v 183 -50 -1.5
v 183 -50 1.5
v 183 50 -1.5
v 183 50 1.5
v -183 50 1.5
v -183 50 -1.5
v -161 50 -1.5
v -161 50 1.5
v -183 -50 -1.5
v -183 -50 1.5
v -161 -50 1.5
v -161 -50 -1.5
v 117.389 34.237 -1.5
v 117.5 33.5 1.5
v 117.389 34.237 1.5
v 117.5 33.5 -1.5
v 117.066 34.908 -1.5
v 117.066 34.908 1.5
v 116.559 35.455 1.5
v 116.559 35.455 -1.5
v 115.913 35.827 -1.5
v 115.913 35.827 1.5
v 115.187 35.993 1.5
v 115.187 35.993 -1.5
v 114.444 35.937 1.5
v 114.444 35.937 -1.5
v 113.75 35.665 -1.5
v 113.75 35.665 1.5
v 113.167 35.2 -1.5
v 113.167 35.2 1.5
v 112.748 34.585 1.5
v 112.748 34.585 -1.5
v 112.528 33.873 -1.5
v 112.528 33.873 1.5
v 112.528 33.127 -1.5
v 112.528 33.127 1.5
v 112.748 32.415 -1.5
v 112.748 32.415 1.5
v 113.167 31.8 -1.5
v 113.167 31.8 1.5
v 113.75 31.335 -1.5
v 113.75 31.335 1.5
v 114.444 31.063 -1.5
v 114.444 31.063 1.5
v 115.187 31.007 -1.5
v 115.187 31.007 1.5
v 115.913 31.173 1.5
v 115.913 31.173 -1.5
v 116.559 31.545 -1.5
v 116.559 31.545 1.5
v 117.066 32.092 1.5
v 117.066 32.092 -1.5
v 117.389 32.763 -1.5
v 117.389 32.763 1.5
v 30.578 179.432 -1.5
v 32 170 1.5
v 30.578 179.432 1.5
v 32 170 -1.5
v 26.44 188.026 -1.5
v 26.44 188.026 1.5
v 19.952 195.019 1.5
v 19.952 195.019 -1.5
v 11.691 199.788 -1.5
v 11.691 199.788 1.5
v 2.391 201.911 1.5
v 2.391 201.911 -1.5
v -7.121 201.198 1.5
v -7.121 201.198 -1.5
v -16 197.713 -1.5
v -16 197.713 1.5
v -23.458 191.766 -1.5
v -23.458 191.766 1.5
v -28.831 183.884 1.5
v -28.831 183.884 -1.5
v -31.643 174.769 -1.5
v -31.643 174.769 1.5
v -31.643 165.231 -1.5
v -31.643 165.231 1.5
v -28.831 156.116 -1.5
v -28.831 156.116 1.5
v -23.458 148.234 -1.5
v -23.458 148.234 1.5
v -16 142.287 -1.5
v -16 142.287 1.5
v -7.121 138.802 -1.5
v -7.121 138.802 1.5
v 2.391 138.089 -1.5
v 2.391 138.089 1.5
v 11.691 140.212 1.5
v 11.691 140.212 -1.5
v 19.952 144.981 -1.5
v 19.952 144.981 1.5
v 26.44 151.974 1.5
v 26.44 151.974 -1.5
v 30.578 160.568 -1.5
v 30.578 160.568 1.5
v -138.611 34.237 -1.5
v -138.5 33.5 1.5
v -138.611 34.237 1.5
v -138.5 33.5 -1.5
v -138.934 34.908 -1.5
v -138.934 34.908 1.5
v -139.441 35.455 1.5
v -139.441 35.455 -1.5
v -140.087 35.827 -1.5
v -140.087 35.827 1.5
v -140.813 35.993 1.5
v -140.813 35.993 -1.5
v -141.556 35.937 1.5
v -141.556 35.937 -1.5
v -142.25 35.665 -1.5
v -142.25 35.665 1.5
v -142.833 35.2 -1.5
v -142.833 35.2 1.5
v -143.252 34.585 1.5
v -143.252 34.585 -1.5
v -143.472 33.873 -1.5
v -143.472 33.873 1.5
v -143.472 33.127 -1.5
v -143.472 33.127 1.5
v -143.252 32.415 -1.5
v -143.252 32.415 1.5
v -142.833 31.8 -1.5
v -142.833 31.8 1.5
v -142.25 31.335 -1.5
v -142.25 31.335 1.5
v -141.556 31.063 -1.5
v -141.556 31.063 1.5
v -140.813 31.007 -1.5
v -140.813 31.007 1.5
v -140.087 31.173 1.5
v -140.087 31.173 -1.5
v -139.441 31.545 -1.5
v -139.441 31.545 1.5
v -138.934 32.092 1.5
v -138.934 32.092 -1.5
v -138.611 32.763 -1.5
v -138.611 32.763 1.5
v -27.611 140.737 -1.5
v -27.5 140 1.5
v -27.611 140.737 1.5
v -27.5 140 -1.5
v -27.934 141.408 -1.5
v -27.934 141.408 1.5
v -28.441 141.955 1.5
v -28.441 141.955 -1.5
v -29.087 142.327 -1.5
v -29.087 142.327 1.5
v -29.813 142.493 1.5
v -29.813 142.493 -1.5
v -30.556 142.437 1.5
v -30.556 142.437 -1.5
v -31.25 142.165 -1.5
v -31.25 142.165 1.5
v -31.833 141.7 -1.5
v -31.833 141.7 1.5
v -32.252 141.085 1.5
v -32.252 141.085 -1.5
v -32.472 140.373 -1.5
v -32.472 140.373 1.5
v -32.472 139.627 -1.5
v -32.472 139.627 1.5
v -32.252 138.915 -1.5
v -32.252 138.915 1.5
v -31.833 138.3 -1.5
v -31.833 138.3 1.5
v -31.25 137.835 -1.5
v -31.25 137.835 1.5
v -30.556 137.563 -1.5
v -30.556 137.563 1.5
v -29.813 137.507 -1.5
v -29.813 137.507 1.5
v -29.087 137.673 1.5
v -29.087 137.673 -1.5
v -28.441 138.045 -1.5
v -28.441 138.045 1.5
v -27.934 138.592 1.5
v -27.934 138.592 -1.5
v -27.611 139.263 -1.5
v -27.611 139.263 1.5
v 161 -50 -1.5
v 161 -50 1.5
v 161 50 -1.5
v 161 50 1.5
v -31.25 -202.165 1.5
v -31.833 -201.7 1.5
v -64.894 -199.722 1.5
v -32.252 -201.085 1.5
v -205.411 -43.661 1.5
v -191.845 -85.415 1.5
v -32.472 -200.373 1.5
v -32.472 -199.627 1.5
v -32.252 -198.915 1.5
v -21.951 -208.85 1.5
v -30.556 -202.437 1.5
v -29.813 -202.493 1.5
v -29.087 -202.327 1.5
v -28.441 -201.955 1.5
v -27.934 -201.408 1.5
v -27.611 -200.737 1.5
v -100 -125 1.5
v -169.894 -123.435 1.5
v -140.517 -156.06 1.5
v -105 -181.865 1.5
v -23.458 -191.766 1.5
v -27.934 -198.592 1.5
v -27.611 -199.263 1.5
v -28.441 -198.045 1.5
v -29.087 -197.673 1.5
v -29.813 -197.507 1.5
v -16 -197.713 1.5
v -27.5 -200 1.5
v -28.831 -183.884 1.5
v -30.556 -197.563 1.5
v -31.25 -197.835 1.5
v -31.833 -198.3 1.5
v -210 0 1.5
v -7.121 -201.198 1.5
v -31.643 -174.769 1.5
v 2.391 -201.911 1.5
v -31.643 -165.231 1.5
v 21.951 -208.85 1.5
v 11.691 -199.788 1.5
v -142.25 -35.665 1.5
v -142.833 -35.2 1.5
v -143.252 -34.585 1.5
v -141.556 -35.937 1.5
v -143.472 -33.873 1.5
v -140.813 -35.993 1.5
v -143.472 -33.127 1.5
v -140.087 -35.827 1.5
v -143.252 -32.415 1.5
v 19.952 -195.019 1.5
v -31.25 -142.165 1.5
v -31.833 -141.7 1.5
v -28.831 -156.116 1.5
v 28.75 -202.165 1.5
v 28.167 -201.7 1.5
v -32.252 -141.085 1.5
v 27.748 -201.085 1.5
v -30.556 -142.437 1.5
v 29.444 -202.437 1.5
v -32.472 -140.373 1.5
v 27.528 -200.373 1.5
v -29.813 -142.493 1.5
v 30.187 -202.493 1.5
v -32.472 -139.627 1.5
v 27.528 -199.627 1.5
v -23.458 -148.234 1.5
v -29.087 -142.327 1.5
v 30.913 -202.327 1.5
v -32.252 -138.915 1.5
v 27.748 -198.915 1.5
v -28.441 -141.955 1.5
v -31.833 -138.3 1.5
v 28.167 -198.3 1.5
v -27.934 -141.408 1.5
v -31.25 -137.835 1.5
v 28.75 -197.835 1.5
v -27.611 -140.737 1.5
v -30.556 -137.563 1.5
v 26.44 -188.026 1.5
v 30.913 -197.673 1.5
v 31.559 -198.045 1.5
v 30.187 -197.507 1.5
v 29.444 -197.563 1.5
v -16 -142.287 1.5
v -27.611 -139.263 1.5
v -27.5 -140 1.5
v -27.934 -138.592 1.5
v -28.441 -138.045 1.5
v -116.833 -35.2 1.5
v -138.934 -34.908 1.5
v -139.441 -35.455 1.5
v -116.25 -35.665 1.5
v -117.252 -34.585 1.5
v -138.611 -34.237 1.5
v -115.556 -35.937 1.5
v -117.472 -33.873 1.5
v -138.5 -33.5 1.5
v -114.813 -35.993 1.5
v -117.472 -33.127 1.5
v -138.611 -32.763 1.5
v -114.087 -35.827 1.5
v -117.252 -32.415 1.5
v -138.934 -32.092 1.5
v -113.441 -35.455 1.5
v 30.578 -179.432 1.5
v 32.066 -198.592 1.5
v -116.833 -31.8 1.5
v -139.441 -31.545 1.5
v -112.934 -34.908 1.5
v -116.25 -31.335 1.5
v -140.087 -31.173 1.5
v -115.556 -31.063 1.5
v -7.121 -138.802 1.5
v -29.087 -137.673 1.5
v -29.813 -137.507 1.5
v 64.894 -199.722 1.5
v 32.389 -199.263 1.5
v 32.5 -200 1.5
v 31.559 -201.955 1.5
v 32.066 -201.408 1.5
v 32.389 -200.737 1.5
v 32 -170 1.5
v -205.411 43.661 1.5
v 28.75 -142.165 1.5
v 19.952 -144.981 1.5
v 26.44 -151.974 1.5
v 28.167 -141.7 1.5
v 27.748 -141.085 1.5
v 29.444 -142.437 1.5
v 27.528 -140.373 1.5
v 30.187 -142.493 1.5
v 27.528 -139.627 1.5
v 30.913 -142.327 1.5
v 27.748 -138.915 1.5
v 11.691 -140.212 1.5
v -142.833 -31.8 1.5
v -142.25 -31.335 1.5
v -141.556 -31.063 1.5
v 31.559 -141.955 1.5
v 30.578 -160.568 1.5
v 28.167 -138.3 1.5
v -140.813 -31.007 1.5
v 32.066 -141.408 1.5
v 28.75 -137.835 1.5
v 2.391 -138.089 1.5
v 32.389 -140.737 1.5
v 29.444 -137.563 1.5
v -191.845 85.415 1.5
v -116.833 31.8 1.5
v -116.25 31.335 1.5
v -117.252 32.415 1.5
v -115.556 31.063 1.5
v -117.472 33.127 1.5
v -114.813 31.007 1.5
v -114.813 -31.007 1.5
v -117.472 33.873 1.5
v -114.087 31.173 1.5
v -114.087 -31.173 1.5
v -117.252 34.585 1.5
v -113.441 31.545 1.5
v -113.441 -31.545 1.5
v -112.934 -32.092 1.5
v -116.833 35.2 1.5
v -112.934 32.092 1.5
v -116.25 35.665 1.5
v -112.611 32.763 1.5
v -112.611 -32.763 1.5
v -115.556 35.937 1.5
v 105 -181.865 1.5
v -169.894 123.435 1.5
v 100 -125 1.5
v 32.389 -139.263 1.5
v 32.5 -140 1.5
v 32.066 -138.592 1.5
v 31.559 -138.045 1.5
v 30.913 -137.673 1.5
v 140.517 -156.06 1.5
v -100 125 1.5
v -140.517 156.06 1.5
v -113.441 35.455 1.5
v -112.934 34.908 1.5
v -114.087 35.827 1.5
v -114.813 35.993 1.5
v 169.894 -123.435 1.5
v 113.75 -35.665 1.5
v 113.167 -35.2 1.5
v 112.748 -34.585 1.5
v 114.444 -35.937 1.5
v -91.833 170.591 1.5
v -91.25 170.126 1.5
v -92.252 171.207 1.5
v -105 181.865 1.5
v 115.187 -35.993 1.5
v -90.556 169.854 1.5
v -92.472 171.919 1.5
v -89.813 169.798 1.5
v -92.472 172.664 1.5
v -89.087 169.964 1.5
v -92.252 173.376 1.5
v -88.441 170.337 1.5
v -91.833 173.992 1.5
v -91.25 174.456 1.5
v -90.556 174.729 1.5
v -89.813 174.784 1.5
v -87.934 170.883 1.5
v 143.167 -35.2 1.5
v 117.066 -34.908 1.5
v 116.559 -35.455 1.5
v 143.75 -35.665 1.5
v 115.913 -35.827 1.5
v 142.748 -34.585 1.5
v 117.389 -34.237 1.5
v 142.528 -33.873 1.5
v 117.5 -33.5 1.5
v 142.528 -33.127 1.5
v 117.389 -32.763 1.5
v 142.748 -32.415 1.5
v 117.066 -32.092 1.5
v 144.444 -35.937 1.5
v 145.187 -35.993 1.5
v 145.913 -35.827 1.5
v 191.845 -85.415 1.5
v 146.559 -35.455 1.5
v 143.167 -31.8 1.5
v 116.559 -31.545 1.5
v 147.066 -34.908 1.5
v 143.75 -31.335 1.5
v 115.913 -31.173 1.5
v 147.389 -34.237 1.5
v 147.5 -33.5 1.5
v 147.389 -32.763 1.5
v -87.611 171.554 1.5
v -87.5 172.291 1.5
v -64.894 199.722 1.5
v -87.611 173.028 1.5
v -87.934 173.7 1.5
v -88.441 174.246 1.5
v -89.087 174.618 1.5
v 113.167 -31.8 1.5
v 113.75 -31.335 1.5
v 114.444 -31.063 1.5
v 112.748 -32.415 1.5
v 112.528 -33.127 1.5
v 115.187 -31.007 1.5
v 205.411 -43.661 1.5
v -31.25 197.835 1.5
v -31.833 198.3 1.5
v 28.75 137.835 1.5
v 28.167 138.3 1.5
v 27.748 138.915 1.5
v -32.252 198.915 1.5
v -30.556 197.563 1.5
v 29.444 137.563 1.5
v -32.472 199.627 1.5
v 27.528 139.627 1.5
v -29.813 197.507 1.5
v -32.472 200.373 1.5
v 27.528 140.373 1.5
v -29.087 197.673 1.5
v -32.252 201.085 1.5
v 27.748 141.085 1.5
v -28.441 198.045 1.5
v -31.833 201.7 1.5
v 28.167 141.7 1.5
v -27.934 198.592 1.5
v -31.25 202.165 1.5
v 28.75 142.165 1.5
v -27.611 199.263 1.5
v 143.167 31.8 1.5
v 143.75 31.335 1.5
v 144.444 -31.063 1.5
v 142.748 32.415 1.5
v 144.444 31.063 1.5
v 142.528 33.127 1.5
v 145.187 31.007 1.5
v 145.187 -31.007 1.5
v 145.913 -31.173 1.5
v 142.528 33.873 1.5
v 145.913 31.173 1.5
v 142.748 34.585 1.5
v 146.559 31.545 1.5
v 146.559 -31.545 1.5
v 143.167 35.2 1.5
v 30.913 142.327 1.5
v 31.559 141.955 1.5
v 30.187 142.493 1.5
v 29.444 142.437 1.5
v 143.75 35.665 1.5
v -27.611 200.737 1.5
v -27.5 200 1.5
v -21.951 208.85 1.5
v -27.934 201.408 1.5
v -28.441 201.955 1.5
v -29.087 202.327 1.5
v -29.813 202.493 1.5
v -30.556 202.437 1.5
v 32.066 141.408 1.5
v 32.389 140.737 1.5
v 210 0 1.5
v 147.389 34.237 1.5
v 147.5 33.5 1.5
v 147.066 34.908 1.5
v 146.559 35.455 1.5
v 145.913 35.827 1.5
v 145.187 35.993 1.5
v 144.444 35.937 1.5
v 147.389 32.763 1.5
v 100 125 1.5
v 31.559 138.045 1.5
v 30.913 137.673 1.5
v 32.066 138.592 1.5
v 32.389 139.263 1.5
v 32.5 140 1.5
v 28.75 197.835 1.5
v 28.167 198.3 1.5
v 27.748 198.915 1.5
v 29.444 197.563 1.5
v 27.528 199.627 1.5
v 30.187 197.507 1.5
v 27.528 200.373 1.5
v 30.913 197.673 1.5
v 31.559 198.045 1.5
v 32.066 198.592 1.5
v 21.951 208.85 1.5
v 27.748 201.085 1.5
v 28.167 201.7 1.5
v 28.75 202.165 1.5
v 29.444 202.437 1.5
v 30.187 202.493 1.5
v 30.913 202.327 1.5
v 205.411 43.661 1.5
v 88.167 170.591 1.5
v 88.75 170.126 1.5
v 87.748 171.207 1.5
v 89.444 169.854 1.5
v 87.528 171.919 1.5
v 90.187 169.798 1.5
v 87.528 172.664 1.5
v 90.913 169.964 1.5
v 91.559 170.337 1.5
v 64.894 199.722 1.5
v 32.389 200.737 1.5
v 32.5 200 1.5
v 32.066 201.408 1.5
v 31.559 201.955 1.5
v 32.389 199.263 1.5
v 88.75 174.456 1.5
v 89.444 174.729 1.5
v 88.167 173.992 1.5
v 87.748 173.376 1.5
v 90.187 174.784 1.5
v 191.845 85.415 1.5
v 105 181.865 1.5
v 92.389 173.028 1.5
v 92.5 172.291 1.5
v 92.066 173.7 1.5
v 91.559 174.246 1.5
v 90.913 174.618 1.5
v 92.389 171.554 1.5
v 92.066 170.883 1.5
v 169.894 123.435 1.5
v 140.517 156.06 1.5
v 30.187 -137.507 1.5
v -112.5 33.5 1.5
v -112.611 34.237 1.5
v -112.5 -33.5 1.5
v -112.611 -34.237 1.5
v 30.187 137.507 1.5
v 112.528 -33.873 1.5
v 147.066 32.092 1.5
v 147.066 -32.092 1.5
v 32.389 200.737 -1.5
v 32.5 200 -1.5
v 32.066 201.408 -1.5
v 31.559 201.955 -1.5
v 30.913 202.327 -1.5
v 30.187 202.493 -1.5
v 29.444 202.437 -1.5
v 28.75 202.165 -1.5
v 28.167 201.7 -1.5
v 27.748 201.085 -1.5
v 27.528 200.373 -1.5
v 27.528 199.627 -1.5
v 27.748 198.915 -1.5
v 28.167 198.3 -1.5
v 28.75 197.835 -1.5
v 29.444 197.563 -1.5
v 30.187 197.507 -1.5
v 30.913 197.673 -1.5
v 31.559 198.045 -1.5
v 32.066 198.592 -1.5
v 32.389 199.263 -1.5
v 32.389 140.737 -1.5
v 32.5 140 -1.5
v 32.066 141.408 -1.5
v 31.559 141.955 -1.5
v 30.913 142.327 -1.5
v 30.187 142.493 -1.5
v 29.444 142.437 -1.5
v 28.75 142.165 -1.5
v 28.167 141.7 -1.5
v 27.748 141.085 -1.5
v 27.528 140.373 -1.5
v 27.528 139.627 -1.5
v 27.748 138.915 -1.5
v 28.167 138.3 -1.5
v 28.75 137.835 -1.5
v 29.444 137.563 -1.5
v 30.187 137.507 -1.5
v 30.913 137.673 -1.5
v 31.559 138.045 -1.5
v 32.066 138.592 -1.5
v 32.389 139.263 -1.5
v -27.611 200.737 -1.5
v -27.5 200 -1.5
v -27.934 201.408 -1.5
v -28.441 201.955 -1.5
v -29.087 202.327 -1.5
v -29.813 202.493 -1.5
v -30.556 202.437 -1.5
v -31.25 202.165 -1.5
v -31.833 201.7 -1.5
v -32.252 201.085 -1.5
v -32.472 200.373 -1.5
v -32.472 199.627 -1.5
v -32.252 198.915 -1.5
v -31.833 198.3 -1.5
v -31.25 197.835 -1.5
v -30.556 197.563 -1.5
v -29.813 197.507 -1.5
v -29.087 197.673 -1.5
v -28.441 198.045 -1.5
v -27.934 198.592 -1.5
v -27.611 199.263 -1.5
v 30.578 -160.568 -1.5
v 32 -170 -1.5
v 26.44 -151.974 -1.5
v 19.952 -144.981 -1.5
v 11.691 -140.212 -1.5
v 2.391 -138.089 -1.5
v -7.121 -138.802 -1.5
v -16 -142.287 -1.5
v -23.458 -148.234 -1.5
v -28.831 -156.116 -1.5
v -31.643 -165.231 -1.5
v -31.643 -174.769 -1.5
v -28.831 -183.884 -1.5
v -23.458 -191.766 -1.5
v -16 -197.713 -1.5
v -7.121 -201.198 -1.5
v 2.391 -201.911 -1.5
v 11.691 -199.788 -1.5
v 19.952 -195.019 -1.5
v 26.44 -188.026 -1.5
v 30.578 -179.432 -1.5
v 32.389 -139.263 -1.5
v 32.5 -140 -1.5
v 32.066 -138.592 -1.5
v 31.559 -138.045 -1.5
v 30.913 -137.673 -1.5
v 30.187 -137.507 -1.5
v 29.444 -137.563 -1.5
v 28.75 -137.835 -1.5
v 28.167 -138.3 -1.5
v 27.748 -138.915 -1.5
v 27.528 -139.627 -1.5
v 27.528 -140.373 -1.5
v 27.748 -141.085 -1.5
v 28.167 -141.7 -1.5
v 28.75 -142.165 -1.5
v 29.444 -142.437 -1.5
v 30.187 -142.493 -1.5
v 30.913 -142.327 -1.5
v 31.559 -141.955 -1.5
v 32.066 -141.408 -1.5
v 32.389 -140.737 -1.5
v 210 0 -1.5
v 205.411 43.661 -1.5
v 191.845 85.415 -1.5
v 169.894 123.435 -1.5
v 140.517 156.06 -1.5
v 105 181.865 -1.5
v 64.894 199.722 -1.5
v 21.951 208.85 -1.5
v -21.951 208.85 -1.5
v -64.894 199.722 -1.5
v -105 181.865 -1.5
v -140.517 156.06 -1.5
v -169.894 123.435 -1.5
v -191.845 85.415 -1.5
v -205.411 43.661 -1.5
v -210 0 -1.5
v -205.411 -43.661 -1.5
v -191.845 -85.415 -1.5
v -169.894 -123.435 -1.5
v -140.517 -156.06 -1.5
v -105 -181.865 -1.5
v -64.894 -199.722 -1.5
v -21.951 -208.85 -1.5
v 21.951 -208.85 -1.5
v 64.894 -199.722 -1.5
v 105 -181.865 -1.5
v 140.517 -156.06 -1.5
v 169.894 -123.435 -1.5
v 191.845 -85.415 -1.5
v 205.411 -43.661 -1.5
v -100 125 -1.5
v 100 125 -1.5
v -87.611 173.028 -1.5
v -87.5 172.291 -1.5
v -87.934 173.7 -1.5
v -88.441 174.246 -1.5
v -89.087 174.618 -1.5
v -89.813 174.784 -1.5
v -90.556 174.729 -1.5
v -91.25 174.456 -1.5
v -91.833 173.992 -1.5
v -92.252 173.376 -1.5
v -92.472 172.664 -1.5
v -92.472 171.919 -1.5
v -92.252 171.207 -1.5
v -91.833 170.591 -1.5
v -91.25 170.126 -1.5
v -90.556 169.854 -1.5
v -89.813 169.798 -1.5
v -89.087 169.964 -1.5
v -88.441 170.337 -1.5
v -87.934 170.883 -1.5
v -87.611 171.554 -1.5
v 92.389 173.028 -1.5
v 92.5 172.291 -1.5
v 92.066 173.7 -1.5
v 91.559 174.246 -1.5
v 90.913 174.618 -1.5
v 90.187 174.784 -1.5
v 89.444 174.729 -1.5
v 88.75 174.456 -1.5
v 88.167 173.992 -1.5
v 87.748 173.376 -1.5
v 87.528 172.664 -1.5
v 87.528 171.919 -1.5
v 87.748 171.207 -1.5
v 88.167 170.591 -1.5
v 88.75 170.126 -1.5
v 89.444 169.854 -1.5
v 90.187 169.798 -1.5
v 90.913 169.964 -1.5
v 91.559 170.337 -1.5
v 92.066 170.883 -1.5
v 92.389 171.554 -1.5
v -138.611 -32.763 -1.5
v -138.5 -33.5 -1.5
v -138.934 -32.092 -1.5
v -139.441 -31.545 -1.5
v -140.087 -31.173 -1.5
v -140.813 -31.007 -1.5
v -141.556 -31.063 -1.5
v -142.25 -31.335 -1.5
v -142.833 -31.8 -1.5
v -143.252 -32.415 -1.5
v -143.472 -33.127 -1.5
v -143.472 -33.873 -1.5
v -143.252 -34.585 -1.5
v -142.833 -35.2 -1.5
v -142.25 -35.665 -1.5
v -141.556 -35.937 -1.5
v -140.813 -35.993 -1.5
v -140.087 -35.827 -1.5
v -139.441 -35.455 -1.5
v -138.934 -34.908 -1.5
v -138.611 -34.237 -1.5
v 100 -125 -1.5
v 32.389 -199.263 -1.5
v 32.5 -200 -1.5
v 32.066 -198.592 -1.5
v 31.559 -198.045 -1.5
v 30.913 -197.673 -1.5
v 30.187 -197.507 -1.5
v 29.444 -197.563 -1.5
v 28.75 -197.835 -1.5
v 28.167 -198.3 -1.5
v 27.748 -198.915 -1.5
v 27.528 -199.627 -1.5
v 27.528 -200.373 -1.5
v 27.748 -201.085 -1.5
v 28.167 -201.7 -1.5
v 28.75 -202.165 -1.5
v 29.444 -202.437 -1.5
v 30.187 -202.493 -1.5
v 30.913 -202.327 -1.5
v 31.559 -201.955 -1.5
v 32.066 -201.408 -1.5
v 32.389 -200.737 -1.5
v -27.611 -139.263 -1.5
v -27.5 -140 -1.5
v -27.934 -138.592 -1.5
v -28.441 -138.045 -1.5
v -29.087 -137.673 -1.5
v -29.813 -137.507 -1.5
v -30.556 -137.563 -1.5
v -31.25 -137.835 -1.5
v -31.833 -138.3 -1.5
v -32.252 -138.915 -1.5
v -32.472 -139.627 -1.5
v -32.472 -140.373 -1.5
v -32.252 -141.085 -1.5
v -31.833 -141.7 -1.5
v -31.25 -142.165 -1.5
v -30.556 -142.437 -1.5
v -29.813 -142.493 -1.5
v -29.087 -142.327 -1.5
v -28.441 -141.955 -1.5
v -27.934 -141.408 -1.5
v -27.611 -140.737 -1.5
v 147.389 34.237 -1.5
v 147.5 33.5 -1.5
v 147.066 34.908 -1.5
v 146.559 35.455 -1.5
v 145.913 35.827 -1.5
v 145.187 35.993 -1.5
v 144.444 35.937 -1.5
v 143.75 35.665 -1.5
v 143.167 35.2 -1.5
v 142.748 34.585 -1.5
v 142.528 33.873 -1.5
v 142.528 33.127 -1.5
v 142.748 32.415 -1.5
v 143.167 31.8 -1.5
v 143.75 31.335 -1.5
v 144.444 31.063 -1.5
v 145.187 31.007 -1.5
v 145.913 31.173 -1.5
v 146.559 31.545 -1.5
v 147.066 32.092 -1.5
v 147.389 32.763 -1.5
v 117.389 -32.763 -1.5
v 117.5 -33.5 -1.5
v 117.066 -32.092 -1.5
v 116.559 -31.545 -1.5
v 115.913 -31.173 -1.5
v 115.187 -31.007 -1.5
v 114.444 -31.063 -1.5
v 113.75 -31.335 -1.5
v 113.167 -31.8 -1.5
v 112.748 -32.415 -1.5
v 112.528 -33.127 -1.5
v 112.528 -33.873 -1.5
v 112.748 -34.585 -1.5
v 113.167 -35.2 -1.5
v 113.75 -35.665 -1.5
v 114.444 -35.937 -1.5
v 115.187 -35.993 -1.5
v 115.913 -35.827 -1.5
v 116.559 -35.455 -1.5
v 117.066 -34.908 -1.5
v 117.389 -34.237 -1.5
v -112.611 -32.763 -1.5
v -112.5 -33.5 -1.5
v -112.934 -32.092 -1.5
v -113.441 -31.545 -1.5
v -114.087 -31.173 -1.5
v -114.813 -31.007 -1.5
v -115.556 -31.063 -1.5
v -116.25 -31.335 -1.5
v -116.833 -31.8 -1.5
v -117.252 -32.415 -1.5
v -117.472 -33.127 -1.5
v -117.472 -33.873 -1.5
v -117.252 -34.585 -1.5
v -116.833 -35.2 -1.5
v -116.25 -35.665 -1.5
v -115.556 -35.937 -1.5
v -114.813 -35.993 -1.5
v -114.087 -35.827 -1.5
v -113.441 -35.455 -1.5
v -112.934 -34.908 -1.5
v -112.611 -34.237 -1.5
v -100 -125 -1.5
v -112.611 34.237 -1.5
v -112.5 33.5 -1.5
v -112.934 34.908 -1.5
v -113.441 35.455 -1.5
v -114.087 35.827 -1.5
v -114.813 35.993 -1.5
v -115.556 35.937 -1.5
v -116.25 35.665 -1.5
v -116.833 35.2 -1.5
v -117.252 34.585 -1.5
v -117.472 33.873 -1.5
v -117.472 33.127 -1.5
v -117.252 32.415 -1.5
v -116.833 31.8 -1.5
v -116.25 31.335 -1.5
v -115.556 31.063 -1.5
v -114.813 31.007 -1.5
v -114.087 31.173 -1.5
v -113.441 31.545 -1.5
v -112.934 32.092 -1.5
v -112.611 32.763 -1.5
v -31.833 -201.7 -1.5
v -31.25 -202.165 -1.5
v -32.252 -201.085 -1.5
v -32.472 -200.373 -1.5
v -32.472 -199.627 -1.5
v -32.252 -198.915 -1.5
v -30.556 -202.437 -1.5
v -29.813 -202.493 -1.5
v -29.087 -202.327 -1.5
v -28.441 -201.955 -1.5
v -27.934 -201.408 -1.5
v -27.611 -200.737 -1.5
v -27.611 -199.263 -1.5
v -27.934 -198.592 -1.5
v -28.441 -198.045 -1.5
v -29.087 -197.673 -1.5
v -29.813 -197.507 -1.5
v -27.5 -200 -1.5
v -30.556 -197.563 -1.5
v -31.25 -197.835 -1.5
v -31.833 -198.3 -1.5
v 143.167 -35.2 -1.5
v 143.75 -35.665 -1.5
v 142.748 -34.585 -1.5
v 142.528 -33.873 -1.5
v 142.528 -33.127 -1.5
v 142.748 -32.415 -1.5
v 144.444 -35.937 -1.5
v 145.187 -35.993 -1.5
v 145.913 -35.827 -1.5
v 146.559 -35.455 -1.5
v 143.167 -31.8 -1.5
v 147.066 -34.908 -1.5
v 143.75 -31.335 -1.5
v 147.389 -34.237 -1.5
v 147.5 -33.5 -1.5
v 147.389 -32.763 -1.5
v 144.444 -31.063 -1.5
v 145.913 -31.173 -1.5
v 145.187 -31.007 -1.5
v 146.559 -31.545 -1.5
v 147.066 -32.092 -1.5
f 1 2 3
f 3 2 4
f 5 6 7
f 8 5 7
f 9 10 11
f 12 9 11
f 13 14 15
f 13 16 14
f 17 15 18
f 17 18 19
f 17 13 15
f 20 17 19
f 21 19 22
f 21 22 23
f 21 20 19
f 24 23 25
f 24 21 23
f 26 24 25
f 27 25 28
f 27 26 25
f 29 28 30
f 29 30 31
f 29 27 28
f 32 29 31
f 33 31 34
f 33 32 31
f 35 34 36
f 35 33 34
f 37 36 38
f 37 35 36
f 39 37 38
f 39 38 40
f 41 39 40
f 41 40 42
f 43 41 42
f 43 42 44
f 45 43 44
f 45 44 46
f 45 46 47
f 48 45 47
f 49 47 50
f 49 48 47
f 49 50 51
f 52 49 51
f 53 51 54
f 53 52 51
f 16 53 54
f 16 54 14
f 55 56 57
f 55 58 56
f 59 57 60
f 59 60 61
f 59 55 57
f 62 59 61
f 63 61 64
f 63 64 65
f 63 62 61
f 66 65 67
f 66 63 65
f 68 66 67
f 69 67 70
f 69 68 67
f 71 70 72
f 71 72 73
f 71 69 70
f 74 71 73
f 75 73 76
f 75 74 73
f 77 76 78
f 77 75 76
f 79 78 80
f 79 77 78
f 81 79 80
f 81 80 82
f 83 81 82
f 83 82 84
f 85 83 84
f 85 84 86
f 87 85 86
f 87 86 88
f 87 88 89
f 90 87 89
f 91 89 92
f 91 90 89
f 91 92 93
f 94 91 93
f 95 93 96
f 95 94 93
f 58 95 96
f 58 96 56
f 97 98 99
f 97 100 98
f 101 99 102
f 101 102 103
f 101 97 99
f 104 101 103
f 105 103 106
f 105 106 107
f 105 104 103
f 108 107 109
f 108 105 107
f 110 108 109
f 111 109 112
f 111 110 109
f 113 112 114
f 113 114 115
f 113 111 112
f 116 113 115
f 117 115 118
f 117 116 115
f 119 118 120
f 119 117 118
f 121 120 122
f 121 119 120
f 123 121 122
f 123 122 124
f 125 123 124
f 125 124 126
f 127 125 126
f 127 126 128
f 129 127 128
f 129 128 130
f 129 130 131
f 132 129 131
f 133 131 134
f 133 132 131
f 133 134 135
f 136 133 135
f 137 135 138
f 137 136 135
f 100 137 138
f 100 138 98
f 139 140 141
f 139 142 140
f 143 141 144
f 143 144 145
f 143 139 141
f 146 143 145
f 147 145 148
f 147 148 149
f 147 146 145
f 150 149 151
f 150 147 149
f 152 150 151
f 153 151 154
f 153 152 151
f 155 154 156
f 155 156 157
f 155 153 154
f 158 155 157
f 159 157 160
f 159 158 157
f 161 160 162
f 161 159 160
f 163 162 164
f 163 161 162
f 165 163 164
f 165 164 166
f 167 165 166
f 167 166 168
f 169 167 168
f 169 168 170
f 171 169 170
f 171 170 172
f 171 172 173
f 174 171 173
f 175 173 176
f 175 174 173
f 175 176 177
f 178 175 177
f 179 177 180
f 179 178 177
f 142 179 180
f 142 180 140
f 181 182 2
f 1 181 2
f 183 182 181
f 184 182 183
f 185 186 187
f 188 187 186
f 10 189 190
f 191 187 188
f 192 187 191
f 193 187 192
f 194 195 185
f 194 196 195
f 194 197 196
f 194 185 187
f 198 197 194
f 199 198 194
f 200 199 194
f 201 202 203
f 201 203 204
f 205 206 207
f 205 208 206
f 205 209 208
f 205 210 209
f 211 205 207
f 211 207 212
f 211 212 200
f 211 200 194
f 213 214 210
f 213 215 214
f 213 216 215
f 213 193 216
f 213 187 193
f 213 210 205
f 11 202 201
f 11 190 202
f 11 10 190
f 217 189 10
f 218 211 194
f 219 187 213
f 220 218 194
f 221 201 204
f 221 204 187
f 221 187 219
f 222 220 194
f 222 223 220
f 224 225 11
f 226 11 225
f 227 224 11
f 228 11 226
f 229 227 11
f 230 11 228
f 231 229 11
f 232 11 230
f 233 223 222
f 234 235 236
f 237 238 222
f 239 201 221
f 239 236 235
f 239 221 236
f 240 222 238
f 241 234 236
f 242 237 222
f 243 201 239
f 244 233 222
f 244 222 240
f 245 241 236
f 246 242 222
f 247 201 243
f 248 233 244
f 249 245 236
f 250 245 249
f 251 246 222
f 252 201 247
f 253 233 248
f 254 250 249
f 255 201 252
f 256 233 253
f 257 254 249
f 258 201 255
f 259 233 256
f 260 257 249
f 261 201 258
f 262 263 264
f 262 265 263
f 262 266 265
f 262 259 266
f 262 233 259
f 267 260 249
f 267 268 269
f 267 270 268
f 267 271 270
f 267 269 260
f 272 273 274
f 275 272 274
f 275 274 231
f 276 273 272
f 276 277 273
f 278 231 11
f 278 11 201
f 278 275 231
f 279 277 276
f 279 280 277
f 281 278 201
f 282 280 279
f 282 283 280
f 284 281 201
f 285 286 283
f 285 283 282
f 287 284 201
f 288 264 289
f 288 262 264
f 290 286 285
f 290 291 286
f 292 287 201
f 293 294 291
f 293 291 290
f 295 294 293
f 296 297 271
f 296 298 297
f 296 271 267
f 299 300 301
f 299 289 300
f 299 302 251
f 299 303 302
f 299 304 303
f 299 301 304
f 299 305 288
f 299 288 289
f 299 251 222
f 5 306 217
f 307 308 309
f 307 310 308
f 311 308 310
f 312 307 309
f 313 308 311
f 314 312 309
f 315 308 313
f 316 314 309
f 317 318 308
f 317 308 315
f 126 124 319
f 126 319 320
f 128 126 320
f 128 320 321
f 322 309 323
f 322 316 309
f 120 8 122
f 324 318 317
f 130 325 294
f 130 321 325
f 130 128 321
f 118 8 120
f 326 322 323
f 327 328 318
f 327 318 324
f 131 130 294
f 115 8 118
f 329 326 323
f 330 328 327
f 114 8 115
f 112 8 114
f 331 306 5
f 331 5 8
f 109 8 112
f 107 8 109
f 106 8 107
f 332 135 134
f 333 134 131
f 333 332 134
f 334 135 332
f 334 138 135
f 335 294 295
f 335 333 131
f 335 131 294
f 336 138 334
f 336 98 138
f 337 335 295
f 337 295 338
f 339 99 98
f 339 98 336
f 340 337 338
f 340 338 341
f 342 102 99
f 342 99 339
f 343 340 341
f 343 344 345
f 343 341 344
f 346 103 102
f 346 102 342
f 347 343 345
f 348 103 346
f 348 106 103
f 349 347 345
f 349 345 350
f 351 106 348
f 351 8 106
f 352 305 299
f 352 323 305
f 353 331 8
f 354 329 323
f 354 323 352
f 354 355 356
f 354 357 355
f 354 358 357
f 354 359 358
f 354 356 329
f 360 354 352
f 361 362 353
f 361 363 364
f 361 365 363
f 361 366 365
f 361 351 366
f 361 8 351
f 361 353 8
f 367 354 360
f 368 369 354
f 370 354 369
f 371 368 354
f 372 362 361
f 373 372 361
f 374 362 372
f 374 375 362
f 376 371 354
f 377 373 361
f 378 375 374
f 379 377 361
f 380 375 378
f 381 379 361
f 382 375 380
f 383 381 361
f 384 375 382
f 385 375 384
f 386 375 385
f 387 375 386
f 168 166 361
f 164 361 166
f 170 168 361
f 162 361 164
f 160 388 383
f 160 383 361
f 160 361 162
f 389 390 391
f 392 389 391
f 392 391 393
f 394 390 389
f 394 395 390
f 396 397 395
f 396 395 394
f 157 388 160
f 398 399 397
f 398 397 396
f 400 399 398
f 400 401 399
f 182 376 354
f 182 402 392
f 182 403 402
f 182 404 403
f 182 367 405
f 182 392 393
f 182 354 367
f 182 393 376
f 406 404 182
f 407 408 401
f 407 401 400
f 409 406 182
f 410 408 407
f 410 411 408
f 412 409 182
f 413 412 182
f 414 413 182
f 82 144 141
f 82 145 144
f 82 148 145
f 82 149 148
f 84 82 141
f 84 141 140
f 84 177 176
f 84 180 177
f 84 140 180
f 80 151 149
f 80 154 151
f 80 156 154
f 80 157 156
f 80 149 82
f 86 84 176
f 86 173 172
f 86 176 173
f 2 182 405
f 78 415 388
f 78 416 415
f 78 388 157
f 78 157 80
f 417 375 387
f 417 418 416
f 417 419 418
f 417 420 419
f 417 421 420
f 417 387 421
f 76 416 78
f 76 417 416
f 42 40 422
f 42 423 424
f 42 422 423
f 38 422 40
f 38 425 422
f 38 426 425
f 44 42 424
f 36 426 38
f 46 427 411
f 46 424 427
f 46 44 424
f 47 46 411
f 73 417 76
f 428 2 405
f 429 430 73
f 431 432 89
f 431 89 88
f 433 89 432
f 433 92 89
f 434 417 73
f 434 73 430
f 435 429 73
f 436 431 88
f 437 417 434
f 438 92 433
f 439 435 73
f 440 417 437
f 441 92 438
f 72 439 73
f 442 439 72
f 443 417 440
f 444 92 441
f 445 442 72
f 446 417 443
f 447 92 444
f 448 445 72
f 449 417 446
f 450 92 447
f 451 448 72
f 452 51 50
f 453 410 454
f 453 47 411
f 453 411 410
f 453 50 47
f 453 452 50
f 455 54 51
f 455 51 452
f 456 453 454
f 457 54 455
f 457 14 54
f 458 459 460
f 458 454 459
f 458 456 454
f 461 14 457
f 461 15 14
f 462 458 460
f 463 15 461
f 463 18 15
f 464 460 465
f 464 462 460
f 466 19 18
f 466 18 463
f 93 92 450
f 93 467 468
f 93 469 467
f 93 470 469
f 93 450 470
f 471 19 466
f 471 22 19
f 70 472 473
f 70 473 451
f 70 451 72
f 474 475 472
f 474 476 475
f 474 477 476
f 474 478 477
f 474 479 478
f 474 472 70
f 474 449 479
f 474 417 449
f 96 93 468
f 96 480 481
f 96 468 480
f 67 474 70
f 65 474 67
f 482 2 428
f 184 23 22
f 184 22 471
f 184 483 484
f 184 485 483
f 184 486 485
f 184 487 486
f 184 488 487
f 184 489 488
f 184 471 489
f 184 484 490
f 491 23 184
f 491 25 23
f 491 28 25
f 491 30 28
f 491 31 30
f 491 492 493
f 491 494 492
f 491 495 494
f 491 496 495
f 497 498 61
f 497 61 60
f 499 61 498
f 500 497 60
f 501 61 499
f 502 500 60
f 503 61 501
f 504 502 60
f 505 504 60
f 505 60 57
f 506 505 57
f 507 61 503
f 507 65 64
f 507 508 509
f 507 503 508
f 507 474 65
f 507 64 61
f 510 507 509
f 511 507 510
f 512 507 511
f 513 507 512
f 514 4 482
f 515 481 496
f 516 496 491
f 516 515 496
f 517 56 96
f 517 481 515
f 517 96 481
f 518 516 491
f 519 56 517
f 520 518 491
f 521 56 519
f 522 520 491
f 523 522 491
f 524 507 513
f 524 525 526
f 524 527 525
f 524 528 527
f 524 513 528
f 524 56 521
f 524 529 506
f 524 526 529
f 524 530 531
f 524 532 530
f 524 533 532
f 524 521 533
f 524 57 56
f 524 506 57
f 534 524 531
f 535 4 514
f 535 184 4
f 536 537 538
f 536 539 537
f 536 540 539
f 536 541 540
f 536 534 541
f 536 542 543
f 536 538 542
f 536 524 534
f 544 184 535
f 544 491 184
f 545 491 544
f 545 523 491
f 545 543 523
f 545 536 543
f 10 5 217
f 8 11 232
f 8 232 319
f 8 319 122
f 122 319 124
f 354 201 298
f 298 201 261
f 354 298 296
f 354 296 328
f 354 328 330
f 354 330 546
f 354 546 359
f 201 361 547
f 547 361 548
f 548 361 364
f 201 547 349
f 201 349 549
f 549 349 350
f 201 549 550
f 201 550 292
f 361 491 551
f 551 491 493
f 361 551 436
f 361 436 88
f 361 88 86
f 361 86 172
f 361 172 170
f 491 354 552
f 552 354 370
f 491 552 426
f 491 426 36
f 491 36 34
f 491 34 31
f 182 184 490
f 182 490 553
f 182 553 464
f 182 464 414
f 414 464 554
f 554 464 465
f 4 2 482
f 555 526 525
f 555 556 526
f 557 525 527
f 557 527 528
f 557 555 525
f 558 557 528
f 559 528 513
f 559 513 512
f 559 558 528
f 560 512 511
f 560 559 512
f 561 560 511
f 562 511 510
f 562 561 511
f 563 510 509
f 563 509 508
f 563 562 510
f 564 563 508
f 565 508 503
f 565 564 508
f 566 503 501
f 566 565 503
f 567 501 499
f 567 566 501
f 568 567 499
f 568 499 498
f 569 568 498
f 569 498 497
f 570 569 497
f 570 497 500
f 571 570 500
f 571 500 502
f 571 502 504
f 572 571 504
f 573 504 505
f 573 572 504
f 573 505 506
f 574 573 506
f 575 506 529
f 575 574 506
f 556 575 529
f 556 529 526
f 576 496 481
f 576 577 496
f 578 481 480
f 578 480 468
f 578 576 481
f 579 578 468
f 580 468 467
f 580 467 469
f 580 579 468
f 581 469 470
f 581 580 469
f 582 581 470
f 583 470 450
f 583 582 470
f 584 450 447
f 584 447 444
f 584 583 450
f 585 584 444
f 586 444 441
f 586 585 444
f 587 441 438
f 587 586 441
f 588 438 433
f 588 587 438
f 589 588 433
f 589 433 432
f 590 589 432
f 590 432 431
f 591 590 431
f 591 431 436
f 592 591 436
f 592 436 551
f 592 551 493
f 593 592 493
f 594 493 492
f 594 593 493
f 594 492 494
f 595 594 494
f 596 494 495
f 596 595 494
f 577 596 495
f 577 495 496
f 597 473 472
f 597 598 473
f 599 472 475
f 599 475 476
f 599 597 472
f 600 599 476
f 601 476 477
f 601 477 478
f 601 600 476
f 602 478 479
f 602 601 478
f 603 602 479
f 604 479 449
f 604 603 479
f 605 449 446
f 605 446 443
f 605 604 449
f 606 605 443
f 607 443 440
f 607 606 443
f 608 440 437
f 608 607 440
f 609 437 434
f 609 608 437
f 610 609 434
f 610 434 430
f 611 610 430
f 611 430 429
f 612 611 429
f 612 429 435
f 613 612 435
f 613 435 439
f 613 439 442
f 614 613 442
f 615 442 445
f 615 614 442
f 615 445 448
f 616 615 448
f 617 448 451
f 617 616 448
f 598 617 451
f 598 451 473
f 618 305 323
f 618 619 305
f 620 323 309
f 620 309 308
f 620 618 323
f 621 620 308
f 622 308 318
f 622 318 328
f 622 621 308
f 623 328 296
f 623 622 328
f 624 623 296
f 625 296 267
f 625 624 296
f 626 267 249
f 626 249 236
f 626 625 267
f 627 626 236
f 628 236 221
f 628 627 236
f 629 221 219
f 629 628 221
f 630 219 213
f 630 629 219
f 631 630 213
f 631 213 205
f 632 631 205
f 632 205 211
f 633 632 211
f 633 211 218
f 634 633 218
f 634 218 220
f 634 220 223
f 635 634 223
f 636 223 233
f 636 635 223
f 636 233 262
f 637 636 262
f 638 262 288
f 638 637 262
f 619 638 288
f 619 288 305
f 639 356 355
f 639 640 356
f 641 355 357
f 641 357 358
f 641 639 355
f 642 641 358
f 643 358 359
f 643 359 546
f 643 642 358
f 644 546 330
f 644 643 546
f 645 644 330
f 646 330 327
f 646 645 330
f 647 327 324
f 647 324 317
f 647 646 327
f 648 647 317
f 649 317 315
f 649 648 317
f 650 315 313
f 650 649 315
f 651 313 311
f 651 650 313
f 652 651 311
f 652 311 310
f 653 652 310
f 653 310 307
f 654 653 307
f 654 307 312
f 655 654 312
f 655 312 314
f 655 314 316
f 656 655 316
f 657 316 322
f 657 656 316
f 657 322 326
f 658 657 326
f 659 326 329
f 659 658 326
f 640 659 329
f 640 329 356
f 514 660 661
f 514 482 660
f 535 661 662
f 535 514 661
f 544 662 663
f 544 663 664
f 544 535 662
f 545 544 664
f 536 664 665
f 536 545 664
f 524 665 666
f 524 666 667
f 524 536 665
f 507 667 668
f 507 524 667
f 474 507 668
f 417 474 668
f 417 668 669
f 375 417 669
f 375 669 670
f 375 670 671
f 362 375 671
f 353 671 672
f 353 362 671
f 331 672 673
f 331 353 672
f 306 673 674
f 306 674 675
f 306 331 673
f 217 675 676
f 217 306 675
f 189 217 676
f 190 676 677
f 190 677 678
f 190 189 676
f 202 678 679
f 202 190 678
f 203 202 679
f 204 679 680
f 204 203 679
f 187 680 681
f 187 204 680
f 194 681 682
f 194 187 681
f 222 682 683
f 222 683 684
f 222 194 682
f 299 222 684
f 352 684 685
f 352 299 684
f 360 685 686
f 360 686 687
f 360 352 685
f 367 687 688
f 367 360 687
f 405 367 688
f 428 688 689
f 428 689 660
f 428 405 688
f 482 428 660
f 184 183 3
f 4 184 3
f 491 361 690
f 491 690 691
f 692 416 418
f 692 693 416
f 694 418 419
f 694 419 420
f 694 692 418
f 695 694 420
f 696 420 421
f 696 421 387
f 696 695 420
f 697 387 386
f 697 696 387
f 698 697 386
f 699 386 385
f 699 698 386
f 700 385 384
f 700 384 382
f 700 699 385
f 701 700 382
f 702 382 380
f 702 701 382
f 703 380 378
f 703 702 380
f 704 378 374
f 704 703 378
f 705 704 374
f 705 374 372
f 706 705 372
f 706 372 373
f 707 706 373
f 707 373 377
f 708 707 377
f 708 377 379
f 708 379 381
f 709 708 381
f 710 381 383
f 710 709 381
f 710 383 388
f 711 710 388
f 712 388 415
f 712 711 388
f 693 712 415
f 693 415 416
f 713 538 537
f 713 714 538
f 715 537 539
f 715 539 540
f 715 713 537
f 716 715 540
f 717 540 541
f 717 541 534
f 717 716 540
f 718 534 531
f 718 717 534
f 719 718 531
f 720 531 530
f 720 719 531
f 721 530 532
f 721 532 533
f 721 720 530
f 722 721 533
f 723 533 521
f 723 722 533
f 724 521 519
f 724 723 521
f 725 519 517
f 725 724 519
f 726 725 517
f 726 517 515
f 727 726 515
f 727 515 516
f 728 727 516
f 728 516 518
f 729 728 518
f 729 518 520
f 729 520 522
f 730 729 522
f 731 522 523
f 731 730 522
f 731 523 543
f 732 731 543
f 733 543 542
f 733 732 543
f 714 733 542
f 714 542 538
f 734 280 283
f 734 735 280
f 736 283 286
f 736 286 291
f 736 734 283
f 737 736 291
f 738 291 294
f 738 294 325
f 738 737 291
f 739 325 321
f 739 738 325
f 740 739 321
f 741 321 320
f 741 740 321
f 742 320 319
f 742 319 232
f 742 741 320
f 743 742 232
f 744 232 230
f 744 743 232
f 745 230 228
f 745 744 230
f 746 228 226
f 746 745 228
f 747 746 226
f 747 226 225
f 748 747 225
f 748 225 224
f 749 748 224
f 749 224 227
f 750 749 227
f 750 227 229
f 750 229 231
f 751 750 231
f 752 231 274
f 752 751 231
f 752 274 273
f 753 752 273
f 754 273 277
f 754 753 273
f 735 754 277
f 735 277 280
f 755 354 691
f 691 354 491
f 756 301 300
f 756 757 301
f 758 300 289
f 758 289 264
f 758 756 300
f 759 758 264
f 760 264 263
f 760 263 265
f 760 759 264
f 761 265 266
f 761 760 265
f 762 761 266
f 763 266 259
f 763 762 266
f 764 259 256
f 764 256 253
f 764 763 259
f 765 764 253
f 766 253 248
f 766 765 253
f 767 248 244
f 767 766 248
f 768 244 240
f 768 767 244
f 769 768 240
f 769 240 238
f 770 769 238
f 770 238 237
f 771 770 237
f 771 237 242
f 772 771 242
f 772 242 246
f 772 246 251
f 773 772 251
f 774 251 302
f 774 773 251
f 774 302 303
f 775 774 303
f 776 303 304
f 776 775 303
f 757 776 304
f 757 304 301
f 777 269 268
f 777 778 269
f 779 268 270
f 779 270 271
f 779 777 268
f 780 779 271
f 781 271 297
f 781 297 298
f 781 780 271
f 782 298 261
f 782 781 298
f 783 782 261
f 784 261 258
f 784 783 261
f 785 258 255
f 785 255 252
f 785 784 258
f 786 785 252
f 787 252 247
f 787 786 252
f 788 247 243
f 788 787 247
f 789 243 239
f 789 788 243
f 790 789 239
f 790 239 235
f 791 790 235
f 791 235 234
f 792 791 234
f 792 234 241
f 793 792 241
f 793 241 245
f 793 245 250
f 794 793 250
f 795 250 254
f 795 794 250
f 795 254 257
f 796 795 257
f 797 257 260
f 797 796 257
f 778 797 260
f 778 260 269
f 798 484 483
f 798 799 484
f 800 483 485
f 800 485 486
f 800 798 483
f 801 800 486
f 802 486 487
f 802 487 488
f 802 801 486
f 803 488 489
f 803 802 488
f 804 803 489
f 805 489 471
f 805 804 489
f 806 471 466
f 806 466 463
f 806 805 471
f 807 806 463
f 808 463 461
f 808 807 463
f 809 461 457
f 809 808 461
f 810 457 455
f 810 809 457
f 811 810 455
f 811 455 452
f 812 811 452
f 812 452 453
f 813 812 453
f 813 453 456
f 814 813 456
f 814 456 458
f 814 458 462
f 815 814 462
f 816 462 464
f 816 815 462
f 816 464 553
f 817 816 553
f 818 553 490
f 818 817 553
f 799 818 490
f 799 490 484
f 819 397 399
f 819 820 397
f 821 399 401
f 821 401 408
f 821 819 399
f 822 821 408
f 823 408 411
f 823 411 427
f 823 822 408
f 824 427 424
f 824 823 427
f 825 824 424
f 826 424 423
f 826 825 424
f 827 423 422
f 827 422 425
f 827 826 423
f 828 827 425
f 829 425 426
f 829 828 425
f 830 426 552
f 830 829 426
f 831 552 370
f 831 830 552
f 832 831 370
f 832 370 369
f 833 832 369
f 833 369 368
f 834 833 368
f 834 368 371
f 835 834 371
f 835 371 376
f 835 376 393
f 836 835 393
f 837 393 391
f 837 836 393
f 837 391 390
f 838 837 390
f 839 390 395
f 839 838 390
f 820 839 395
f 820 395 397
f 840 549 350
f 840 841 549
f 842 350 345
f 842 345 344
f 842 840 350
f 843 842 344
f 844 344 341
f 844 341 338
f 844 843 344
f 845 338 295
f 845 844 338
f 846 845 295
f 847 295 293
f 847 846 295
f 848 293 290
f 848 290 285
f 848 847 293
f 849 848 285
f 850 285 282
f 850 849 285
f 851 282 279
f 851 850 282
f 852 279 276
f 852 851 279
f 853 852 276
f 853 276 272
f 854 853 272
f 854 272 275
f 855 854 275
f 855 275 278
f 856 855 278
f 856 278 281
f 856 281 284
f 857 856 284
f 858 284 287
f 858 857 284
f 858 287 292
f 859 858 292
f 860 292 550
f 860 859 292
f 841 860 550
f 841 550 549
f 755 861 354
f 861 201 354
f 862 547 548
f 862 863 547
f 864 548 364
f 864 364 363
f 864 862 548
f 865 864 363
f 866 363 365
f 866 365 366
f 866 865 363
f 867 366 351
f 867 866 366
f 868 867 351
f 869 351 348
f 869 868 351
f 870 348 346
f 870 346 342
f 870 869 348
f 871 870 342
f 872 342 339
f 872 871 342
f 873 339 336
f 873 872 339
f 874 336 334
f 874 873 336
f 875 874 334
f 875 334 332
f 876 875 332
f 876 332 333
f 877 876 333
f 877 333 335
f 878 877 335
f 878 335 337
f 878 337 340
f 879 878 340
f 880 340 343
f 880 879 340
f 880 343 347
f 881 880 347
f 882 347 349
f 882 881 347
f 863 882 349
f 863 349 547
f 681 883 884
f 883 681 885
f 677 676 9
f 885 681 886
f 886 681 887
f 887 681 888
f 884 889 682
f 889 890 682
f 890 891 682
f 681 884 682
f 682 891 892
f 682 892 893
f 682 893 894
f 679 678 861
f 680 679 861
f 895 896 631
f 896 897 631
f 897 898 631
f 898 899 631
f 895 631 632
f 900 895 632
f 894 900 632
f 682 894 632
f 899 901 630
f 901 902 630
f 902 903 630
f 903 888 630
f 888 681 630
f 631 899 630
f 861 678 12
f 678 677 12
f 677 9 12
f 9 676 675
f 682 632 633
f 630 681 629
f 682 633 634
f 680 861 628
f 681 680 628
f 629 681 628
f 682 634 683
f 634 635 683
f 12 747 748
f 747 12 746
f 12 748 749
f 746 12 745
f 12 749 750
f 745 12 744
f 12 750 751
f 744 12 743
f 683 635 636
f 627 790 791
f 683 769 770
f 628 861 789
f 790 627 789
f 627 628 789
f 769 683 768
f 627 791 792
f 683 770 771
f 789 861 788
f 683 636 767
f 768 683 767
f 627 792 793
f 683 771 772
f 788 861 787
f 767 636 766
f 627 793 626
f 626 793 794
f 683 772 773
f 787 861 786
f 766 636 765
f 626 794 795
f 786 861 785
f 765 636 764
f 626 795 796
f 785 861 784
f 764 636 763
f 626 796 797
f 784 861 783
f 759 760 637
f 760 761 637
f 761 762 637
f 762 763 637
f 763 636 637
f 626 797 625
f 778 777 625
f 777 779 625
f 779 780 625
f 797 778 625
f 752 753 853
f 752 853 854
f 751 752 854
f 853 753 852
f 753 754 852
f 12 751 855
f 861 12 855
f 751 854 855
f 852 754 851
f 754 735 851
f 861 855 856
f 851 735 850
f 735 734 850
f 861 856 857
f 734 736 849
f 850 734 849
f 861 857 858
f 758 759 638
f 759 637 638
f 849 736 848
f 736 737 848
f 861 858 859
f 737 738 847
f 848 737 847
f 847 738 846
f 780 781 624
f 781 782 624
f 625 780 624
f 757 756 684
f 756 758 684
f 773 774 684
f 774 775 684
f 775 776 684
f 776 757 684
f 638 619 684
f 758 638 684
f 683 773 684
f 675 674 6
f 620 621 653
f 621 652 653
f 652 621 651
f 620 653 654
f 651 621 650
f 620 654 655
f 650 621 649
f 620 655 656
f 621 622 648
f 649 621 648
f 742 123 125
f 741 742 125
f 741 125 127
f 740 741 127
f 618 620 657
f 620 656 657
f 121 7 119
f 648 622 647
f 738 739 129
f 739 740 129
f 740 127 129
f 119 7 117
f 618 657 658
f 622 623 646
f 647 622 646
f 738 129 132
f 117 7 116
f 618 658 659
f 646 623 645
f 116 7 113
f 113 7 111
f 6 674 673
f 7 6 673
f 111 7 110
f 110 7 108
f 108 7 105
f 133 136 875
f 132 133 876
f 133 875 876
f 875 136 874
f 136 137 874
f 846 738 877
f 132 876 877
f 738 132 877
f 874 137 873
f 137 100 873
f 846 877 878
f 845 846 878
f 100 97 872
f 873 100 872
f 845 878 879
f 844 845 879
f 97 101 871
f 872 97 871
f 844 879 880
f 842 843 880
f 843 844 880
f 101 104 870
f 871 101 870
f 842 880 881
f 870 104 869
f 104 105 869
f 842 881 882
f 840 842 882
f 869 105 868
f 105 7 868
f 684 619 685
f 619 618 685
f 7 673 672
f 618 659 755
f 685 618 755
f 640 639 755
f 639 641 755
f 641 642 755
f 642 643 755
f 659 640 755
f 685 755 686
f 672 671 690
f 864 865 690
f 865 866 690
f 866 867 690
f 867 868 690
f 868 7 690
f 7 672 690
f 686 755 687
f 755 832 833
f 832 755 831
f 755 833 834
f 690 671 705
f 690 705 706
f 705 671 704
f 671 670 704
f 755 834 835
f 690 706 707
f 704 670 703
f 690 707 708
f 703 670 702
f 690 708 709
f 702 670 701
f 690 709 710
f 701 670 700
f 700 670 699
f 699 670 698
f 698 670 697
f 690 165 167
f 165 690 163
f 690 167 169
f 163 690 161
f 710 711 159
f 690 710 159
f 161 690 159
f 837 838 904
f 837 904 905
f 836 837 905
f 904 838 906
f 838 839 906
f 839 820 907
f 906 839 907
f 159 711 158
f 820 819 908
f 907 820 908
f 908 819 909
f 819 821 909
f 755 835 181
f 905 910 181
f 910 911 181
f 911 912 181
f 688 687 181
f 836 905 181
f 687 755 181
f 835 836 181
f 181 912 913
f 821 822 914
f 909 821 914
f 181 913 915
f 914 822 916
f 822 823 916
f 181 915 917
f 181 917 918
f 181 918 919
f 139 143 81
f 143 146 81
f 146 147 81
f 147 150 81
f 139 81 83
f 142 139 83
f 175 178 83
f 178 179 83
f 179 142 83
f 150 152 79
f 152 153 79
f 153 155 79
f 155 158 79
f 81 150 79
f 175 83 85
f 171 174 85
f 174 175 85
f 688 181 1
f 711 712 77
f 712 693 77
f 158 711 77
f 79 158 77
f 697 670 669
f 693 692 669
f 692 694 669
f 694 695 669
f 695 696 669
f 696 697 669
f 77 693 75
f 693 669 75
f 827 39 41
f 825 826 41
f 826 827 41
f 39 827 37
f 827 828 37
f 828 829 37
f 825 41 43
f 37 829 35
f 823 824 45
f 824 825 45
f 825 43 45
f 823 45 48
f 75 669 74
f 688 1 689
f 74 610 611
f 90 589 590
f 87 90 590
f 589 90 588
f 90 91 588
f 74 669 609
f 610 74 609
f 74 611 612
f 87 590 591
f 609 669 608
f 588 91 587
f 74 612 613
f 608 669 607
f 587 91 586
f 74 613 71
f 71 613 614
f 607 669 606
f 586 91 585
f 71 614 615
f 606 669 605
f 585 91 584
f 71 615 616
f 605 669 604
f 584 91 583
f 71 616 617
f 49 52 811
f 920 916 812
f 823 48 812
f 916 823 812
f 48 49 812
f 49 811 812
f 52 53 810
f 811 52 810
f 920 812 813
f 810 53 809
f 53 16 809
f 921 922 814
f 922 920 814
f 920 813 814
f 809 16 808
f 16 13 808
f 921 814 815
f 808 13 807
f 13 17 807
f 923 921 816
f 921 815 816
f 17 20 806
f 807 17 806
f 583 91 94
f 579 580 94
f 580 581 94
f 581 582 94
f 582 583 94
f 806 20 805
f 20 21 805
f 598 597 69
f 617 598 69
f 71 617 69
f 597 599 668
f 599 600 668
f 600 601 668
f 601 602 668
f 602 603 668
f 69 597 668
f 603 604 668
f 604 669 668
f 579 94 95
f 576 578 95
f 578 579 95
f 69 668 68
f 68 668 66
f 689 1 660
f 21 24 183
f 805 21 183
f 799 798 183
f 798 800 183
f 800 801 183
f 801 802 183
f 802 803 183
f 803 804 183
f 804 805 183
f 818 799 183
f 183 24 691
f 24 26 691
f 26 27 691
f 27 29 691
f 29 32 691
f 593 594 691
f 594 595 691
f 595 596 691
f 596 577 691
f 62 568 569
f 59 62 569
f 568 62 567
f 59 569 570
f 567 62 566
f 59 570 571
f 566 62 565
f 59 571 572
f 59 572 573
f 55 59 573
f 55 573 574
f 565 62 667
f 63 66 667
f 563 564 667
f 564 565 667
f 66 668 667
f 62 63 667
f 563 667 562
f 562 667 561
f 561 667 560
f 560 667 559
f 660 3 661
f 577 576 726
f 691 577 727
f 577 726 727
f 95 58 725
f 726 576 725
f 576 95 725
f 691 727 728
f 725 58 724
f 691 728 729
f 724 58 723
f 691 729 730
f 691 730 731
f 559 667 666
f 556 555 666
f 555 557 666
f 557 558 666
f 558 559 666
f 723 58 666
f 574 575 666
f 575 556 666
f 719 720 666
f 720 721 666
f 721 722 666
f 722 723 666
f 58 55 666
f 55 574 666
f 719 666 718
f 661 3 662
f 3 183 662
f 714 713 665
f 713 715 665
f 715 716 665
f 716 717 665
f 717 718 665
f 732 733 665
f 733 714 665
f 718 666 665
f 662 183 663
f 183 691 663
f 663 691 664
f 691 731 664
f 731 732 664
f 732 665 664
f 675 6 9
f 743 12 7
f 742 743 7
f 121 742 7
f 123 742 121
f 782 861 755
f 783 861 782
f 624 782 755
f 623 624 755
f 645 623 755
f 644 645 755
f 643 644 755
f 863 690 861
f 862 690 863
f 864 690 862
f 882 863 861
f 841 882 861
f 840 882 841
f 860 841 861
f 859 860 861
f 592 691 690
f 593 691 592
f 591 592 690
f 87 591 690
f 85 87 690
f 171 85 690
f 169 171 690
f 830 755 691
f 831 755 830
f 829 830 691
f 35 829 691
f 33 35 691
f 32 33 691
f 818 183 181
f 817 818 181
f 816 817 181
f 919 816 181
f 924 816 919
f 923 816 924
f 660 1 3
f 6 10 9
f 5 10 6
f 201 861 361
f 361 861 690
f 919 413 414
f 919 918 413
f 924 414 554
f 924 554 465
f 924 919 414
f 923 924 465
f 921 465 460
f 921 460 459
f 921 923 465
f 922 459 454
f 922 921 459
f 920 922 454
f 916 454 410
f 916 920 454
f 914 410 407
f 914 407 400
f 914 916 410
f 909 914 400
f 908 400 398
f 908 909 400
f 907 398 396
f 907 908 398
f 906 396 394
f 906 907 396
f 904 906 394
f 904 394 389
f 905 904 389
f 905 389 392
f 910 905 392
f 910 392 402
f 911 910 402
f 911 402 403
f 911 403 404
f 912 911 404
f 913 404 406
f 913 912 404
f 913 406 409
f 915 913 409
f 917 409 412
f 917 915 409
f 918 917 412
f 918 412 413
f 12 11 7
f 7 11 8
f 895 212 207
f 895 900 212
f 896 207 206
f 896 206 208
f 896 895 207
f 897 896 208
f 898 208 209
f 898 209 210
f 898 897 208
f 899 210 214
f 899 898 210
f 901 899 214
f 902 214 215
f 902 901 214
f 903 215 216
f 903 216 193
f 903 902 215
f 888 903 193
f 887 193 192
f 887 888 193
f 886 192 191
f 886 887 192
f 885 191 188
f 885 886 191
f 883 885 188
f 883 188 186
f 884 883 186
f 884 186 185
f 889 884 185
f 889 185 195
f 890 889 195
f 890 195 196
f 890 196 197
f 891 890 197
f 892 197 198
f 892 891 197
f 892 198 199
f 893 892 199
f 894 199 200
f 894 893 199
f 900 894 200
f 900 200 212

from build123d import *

# Parameters (mm, degrees)
SKETCH_R   = 210
SKETCH_R_2 = 32
SKETCH_R_3 = 2.5
SKETCH_W   = 22
SKETCH_H   = 100
SKETCH_W_2 = 200
SKETCH_H_2 = 250
PAD_DEPTH  = 1.5


with BuildPart() as part:
    # Sketch → Pad (new body, symmetric)
    with BuildSketch(Plane.XY):
        Circle(SKETCH_R)
        with Locations((0, 170)):
            Circle(SKETCH_R_2, mode=Mode.SUBTRACT)
        with Locations((0, -170)):
            Circle(SKETCH_R_2, mode=Mode.SUBTRACT)
        with Locations((-141, 33.5)):
            Circle(SKETCH_R_3, mode=Mode.SUBTRACT)
        with Locations((-141, -33.5)):
            Circle(SKETCH_R_3, mode=Mode.SUBTRACT)
        with Locations((-115, 33.5)):
            Circle(SKETCH_R_3, mode=Mode.SUBTRACT)
        with Locations((-115, -33.5)):
            Circle(SKETCH_R_3, mode=Mode.SUBTRACT)
        with Locations((115, 33.5)):
            Circle(SKETCH_R_3, mode=Mode.SUBTRACT)
        with Locations((115, -33.5)):
            Circle(SKETCH_R_3, mode=Mode.SUBTRACT)
        with Locations((145, 33.5)):
            Circle(SKETCH_R_3, mode=Mode.SUBTRACT)
        with Locations((145, -33.5)):
            Circle(SKETCH_R_3, mode=Mode.SUBTRACT)
        with Locations((-90, 172.29129)):
            Circle(SKETCH_R_3, mode=Mode.SUBTRACT)
        with Locations((90, 172.29129)):
            Circle(SKETCH_R_3, mode=Mode.SUBTRACT)
        with Locations((-30, 200)):
            Circle(SKETCH_R_3, mode=Mode.SUBTRACT)
        with Locations((30, 200)):
            Circle(SKETCH_R_3, mode=Mode.SUBTRACT)
        with Locations((-30, 140)):
            Circle(SKETCH_R_3, mode=Mode.SUBTRACT)
        with Locations((30, 140)):
            Circle(SKETCH_R_3, mode=Mode.SUBTRACT)
        with Locations((-30, -140)):
            Circle(SKETCH_R_3, mode=Mode.SUBTRACT)
        with Locations((30, -140)):
            Circle(SKETCH_R_3, mode=Mode.SUBTRACT)
        with Locations((-30, -200)):
            Circle(SKETCH_R_3, mode=Mode.SUBTRACT)
        with Locations((30, -200)):
            Circle(SKETCH_R_3, mode=Mode.SUBTRACT)
        with Locations((-172, 0)):
            Rectangle(SKETCH_W, SKETCH_H, mode=Mode.SUBTRACT)
        with Locations((172, 0)):
            Rectangle(SKETCH_W, SKETCH_H, mode=Mode.SUBTRACT)
        Rectangle(SKETCH_W_2, SKETCH_H_2, mode=Mode.SUBTRACT)
    extrude(amount=PAD_DEPTH, both=True)


solid = part.part
